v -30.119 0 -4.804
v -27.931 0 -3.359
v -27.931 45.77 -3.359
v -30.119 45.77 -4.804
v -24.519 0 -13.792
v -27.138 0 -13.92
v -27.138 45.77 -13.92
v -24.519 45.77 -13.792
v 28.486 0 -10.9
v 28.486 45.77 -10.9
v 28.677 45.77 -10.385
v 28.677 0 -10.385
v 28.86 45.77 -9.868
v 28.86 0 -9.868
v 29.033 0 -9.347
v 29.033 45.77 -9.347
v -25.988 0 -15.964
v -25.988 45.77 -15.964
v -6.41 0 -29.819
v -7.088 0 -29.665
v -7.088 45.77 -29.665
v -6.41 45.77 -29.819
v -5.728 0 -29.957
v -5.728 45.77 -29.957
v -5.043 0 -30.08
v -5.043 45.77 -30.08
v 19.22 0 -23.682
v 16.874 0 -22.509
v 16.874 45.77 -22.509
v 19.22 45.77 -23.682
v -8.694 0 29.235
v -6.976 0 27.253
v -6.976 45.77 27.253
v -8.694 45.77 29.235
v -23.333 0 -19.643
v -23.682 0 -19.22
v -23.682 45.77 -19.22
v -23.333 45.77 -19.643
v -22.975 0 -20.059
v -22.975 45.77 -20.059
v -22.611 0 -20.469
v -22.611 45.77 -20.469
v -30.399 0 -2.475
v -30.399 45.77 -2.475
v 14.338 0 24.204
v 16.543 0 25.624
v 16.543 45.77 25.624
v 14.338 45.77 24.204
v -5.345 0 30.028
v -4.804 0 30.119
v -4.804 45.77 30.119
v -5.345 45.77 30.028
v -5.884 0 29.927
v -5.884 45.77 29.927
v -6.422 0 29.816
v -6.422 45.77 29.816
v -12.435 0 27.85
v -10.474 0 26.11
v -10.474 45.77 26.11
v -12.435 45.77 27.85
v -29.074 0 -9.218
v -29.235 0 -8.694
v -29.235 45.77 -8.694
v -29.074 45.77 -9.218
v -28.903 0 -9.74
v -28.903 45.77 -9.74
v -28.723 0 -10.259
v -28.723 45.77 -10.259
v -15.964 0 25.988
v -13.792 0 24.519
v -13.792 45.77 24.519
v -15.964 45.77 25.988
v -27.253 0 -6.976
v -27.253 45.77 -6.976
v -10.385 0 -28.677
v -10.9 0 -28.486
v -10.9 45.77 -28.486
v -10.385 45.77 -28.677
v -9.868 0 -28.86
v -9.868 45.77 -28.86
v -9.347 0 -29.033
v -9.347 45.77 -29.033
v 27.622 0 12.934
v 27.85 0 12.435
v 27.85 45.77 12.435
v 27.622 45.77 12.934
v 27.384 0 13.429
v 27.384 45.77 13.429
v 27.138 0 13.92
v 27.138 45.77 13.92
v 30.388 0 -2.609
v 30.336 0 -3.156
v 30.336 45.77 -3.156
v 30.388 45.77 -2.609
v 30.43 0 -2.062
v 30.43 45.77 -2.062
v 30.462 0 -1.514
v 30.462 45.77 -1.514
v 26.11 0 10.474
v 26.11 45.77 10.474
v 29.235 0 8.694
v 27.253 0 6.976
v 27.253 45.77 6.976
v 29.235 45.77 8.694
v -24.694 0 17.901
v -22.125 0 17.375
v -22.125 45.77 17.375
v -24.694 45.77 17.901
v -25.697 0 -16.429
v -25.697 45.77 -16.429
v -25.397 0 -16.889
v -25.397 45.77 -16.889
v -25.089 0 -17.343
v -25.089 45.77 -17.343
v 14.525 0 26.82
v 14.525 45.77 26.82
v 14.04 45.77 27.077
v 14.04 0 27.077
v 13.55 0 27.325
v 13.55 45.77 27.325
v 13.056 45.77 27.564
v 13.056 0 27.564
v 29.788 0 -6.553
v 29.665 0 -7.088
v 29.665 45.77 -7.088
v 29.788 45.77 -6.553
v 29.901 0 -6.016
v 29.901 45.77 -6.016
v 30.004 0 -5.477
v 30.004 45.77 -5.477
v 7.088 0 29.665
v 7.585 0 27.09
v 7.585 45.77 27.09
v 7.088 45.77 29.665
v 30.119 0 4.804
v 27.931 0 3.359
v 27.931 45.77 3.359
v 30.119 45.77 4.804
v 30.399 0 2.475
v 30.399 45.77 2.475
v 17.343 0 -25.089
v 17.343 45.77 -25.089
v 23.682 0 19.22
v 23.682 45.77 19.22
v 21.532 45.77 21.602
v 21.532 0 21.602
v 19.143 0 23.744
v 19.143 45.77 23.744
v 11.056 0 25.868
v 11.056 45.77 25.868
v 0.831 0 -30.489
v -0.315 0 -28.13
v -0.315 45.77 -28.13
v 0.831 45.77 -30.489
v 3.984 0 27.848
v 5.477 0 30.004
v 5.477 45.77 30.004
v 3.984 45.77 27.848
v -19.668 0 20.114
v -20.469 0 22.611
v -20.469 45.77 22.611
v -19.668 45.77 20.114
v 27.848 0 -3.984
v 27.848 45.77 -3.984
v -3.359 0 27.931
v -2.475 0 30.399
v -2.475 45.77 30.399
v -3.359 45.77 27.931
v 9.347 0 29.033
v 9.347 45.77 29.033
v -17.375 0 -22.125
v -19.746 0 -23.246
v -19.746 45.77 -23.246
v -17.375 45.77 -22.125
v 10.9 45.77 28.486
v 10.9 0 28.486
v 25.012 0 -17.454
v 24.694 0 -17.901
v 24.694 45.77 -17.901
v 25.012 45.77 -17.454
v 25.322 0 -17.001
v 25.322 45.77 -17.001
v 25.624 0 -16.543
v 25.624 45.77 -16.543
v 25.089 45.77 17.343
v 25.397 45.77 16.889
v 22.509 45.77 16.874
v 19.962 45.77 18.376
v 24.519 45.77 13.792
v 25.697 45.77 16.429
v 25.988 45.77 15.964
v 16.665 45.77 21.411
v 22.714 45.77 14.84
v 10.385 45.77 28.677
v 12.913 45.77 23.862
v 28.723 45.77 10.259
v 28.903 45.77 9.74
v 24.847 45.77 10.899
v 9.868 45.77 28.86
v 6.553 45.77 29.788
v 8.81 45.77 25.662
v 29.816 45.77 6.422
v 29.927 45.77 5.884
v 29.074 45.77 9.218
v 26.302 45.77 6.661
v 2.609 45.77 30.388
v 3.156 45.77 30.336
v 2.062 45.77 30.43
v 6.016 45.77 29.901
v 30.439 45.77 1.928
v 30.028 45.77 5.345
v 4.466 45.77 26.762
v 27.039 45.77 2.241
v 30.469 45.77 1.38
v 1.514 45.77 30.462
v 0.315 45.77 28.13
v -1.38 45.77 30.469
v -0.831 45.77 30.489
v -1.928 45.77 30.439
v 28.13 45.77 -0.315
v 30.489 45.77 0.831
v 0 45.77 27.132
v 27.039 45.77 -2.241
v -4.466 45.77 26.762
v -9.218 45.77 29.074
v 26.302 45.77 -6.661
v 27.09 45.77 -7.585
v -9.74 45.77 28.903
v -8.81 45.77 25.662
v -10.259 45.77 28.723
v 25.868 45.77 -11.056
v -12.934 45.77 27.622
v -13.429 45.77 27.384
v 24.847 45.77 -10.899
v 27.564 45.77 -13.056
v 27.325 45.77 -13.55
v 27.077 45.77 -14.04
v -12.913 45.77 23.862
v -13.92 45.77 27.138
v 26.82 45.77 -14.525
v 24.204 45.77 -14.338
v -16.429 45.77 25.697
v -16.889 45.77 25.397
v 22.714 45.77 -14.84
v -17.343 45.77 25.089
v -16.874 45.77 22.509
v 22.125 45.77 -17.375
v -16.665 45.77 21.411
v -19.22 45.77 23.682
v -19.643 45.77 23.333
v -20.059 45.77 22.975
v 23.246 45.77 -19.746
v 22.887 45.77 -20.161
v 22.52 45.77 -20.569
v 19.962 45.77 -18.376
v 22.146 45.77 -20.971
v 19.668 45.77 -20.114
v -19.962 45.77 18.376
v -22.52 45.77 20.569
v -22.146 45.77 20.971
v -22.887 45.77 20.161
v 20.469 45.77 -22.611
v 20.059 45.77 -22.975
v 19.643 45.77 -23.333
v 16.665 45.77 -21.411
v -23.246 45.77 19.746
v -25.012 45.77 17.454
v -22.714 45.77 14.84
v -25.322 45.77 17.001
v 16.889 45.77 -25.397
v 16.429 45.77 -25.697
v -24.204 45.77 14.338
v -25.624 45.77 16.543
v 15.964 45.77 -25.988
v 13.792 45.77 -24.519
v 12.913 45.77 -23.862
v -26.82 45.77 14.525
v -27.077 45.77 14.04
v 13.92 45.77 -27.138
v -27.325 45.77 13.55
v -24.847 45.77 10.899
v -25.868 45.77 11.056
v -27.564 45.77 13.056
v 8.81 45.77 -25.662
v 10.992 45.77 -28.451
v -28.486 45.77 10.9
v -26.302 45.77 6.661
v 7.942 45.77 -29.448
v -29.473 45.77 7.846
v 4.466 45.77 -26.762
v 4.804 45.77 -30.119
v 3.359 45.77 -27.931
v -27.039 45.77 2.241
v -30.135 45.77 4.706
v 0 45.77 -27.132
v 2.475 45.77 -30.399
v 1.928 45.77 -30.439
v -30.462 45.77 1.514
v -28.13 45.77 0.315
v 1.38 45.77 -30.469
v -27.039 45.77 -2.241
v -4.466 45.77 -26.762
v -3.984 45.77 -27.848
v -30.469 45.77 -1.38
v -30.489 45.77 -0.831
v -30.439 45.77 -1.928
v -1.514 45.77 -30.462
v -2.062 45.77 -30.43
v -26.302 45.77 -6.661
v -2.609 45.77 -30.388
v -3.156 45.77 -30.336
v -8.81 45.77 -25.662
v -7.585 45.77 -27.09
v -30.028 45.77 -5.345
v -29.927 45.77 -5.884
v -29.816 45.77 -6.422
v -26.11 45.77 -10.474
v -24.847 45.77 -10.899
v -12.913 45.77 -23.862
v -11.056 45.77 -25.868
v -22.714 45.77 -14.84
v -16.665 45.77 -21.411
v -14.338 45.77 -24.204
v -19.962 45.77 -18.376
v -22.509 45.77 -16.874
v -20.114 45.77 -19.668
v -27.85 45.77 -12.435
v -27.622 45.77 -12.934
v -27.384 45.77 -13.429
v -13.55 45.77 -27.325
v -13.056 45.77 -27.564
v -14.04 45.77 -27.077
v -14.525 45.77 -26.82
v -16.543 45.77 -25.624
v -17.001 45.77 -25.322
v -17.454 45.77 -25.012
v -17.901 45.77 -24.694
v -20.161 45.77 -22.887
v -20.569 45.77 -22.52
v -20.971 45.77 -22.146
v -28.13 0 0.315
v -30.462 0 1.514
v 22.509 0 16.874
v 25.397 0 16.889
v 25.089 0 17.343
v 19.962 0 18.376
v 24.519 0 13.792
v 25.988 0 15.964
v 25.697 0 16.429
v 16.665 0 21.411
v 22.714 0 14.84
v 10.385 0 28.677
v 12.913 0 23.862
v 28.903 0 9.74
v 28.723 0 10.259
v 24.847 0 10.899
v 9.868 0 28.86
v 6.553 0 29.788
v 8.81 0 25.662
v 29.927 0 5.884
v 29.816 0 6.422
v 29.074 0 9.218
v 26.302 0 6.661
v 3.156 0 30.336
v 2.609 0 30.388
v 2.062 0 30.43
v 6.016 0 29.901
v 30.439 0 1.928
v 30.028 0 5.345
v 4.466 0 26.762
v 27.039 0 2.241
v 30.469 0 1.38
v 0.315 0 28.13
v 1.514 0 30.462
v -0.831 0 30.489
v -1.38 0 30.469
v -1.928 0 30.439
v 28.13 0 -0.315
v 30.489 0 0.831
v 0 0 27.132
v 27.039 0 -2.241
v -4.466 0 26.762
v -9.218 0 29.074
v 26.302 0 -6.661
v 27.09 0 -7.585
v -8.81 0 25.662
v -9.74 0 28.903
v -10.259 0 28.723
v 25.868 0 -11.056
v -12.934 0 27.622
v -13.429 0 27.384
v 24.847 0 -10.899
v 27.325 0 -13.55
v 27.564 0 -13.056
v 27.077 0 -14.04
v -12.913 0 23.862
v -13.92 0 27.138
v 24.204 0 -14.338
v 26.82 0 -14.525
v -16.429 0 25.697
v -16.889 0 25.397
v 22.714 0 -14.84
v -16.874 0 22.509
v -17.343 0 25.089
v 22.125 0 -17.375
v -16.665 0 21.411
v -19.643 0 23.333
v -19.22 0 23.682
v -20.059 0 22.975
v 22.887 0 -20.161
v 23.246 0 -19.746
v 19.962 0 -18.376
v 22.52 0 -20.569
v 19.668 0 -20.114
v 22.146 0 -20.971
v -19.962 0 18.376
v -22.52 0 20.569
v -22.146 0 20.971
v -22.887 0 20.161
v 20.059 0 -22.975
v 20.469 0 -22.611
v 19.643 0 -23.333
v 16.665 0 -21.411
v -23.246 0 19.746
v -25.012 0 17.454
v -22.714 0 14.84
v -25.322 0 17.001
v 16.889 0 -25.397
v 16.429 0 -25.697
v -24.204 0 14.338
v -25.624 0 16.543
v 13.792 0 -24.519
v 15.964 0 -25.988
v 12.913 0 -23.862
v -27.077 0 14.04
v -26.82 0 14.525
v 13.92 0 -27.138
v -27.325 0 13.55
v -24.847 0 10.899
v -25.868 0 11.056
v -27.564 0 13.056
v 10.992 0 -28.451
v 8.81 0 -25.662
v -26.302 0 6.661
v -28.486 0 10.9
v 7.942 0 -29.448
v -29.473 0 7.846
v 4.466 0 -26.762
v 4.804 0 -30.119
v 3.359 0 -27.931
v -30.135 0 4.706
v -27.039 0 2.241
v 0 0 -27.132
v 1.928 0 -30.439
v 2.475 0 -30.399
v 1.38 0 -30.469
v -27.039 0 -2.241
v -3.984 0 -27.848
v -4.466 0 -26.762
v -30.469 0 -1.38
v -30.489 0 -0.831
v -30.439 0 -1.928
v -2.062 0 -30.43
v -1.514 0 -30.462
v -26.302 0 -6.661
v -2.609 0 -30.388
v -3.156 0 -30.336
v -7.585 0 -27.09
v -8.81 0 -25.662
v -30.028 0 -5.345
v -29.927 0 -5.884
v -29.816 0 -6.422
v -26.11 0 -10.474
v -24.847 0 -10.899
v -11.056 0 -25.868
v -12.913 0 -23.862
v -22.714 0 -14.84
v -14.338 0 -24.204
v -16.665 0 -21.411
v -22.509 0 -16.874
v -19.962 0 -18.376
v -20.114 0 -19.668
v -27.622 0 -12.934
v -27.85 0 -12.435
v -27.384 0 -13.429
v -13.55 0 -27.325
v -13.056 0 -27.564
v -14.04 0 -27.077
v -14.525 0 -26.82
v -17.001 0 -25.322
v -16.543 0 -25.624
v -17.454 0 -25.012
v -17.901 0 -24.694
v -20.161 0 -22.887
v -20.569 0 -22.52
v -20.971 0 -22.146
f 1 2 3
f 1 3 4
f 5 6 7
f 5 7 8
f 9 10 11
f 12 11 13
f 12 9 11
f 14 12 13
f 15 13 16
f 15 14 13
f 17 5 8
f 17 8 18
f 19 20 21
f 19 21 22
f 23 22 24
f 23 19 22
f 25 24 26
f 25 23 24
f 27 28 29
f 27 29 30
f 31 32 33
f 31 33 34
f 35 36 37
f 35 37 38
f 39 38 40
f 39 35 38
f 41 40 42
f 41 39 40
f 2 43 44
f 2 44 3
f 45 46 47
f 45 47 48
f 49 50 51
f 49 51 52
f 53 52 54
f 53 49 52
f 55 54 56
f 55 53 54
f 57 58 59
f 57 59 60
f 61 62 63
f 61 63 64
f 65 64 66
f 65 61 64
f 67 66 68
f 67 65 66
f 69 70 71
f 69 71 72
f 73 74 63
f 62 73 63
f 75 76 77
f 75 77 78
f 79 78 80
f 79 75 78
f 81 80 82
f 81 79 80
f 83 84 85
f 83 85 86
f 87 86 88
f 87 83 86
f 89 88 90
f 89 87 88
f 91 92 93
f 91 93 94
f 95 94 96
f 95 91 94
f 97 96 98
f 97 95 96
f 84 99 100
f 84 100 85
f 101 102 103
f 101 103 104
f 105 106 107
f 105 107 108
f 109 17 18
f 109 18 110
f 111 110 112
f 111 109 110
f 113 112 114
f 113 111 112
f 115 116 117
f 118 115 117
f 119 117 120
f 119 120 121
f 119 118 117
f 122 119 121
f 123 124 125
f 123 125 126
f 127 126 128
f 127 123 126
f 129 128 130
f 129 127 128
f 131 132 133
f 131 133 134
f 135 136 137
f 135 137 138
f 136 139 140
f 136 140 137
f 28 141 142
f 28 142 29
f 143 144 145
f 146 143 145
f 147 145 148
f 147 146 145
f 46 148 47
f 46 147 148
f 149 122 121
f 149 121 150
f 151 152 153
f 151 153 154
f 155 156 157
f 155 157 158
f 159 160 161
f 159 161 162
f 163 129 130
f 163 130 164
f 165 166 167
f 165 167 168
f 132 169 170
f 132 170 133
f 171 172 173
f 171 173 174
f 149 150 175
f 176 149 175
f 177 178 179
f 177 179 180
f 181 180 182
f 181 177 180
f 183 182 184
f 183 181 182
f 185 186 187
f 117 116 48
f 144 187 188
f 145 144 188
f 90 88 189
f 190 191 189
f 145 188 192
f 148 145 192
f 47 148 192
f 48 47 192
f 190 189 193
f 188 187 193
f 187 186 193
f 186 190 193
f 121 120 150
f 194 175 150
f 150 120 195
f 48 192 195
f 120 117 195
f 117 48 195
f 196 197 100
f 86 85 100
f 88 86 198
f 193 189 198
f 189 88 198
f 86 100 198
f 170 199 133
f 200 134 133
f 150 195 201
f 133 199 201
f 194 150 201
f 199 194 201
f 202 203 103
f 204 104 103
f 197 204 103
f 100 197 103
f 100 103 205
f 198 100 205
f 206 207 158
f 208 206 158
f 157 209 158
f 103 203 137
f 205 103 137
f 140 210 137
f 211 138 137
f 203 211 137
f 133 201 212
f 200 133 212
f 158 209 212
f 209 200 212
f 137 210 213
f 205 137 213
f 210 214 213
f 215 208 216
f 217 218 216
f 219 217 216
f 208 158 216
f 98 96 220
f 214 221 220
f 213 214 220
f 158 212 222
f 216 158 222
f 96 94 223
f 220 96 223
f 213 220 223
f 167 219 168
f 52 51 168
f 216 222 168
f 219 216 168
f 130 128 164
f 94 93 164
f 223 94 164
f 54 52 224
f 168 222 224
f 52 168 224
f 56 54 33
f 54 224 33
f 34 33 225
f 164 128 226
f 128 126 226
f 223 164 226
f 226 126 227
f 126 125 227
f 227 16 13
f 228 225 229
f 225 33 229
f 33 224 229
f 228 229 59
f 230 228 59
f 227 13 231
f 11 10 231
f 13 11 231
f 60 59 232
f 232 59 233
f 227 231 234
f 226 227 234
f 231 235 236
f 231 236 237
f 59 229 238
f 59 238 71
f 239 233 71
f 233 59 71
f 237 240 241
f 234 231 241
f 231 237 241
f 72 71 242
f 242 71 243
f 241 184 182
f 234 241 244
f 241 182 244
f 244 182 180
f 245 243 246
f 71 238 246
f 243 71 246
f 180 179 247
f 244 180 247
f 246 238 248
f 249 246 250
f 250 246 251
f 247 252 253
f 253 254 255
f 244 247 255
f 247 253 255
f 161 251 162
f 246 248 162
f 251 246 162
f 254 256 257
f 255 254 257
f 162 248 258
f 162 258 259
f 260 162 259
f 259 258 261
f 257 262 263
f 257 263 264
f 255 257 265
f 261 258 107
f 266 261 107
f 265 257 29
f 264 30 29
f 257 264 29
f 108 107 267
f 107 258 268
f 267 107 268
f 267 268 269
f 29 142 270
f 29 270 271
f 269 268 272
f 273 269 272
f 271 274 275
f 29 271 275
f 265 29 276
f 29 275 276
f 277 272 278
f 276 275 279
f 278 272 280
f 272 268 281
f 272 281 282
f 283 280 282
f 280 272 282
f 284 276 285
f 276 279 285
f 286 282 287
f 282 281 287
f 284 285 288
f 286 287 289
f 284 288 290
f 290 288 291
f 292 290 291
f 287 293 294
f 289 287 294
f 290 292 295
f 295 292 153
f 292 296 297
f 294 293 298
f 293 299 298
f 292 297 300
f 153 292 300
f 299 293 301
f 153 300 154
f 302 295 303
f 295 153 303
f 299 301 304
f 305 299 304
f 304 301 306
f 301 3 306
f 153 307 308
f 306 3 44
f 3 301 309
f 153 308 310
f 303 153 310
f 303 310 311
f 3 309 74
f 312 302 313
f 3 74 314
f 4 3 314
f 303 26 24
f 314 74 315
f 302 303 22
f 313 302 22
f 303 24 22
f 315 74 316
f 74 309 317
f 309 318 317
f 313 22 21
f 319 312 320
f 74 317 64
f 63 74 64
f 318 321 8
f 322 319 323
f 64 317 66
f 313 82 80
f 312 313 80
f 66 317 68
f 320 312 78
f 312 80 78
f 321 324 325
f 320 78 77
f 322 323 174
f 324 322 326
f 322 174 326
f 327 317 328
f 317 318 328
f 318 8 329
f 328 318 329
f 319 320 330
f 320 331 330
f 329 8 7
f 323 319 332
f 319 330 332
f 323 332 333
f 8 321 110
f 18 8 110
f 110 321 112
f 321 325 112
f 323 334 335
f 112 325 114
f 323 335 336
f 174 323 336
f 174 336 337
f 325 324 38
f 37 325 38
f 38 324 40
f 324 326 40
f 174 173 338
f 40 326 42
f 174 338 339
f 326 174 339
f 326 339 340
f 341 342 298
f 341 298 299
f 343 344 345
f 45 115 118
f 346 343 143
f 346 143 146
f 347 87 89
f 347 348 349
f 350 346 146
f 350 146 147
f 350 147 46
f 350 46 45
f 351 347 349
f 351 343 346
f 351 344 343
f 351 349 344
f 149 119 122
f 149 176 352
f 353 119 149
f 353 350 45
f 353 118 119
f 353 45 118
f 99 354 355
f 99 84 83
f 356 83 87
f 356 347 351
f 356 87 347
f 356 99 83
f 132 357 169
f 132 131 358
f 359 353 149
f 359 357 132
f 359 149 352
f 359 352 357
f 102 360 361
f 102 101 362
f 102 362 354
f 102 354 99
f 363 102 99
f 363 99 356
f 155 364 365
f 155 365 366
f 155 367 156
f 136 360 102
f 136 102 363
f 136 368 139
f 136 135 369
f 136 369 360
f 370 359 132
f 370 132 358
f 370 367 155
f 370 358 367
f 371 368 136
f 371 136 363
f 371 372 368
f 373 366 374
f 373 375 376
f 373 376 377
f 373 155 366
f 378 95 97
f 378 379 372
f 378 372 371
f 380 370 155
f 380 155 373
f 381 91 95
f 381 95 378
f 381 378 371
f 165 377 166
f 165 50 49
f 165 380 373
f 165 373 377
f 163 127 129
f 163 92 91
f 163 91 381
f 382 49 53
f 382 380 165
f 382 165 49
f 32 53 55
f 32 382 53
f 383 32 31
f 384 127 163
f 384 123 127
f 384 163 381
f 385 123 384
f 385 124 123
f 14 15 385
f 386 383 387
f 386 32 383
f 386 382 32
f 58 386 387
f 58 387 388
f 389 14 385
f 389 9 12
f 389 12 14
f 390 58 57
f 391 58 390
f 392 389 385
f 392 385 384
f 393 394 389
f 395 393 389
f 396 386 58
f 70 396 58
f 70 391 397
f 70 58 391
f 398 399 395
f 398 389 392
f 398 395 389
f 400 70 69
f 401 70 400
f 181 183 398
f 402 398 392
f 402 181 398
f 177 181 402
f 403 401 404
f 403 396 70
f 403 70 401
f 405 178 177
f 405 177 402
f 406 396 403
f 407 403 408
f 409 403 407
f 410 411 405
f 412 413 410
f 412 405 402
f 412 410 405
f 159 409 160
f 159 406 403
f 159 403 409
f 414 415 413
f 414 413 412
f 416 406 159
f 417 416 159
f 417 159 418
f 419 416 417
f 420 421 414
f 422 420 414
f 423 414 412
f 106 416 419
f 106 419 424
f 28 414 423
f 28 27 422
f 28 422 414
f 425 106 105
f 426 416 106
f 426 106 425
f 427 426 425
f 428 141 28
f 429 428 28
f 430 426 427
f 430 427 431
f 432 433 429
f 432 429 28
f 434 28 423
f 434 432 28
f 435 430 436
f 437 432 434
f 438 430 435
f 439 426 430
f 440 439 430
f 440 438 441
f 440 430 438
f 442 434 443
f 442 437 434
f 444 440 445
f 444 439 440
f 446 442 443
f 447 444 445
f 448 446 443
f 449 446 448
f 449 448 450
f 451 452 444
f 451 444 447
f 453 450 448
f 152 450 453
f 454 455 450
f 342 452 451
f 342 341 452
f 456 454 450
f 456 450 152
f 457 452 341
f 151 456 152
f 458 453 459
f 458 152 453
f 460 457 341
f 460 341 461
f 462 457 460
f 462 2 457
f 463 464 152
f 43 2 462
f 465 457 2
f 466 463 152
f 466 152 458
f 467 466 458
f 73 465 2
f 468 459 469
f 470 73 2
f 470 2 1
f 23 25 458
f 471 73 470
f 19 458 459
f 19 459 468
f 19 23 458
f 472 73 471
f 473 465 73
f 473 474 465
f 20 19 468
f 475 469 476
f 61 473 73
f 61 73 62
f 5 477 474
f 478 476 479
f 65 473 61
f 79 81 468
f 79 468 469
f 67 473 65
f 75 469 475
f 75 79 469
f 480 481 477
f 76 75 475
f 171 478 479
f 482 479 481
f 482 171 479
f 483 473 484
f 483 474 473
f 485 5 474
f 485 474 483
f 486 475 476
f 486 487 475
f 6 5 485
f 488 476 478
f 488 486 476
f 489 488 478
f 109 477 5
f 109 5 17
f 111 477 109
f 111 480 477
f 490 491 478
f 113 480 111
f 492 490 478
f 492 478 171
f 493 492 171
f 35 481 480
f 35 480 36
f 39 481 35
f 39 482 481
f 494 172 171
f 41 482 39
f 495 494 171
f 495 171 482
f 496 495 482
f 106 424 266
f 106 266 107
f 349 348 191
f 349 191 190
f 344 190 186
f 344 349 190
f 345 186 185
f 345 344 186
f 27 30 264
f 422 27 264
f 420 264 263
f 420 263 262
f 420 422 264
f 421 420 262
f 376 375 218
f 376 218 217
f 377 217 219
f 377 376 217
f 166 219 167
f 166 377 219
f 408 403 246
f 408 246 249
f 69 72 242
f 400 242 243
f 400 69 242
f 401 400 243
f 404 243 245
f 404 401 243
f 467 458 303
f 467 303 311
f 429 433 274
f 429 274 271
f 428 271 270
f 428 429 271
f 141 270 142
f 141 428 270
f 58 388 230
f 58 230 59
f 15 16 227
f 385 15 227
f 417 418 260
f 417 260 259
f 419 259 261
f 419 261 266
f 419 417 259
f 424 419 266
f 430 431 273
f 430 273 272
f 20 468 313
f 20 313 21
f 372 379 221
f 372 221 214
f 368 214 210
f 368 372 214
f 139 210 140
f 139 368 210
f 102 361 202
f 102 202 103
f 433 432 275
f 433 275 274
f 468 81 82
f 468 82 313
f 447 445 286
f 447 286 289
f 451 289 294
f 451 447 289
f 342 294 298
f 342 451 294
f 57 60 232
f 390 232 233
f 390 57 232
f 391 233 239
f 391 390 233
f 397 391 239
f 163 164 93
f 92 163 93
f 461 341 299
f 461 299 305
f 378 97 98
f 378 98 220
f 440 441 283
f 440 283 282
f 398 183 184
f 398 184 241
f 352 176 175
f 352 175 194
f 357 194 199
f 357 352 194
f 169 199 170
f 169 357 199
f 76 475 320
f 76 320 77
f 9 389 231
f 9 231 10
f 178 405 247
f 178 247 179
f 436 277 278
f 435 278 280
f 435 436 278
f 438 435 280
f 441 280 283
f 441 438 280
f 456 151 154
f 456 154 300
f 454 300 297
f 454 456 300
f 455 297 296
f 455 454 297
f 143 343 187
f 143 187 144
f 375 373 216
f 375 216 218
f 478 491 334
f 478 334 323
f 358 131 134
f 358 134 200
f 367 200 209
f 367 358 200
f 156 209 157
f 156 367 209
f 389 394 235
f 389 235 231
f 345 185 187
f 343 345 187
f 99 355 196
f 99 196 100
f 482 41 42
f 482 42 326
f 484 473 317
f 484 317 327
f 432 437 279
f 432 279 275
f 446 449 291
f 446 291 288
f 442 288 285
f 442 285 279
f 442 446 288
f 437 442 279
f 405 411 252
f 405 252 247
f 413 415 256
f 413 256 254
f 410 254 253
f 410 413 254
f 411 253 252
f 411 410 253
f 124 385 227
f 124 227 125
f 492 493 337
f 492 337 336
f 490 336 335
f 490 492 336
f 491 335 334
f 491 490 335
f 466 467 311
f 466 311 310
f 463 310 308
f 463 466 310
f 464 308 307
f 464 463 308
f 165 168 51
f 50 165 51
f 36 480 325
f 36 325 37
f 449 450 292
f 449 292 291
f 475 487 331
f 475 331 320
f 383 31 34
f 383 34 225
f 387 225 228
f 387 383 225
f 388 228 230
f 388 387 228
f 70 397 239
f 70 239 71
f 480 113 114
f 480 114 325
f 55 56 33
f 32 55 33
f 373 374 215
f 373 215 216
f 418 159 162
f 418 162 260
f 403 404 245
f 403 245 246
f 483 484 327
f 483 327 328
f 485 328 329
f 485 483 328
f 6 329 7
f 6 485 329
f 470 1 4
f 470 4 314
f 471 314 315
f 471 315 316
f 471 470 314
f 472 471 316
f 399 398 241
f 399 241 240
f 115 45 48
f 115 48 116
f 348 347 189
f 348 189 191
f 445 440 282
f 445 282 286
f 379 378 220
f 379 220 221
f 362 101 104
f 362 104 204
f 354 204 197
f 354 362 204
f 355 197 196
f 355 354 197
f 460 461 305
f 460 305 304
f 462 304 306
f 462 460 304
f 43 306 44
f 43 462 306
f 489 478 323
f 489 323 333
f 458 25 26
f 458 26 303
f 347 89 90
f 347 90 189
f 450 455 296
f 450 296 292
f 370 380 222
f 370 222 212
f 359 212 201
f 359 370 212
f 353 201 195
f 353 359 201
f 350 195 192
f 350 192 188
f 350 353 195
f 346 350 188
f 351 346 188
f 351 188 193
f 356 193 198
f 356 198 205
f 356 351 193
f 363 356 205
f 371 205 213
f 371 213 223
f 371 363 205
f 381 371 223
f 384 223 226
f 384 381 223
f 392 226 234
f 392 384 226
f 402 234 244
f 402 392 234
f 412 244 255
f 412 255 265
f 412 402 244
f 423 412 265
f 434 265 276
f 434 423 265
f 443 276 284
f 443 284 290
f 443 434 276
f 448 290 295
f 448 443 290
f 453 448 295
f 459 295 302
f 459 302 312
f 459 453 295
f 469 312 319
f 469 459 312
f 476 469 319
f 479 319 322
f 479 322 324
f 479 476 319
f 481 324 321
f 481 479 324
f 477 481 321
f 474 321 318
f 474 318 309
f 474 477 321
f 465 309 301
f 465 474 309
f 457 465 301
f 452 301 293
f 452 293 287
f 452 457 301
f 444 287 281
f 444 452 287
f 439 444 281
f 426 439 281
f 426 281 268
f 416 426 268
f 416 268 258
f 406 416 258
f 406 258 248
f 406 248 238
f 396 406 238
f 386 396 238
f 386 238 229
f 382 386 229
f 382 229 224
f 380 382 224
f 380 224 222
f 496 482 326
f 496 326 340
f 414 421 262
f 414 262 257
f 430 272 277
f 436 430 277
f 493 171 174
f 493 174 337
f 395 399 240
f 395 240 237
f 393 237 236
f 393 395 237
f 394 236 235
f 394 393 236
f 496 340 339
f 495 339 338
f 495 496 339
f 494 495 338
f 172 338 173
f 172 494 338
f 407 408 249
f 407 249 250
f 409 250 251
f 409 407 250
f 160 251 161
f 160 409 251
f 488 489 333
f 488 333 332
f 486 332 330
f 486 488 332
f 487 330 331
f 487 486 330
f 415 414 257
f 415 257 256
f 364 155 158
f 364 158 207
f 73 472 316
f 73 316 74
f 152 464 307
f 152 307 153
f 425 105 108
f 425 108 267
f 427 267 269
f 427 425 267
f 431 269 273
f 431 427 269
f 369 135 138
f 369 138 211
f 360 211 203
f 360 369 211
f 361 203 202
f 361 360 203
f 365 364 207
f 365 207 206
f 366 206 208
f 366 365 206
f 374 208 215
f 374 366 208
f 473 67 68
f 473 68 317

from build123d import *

# Parameters (mm, degrees)
SKETCH1_R           = 27.131966011
BOSS_EXTRUDE1_DEPTH = 45.77


with BuildPart() as part:
    # Sketch1 → Boss-Extrude1 (new body)
    with BuildSketch(Plane(origin=(0, 0, 0), x_dir=(1, 0, 0), z_dir=(0, 1, 0))):
        with BuildLine():
            Line((-3.984261156, 27.848398027), (-3.155526874, 30.336328812))
            ThreePointArc((-3.155526874, 30.336328812), (-2.335703763, 30.410437264), (-1.5141793, 30.462394497))
            Line((-1.5141793, 30.462394497), (-0.315230151, 28.130201914))
            Line((-0.315230151, 28.130201914), (0.831154566, 30.48867707))
            ThreePointArc((0.831154566, 30.48867707), (1.65363686, 30.455143124), (2.474914637, 30.399425407))
            Line((2.474914637, 30.399425407), (3.359194573, 27.930690283))
            Line((3.359194573, 27.930690283), (4.803614875, 30.119355554))
            ThreePointArc((4.803614875, 30.119355554), (9.479661295, 28.989418191), (13.919878882, 27.138300594))
            Line((13.919878882, 27.138300594), (13.792102919, 24.51908612))
            Line((13.792102919, 24.51908612), (15.964140245, 25.988394149))
            ThreePointArc((15.964140245, 25.988394149), (16.659663243, 25.548112068), (17.343051232, 25.089220567))
            Line((17.343051232, 25.089220567), (16.874492259, 22.509091617))
            Line((16.874492259, 22.509091617), (19.21973095, 23.682321883))
            ThreePointArc((19.21973095, 23.682321883), (19.851835217, 23.155022565), (20.469479277, 22.610856977))
            Line((20.469479277, 22.610856977), (19.668154402, 20.113960352))
            Line((19.668154402, 20.113960352), (22.146466743, 20.971038467))
            ThreePointArc((22.146466743, 20.971038467), (22.704336831, 20.365744156), (23.245668935, 19.745615304))
            Line((23.245668935, 19.745615304), (22.125289014, 17.374673686))
            Line((22.125289014, 17.374673686), (24.69427034, 17.900934736))
            ThreePointArc((24.69427034, 17.900934736), (25.168360968, 17.228002177), (25.624118803, 16.542520632))
            Line((25.624118803, 16.542520632), (24.203853841, 14.338101571))
            Line((24.203853841, 14.338101571), (26.8195481, 14.52454104))
            ThreePointArc((26.8195481, 14.52454104), (27.201747469, 13.795484281), (27.564132913, 13.056378805))
            Line((27.564132913, 13.056378805), (25.868284062, 11.0562006))
            Line((25.868284062, 11.0562006), (28.485935925, 10.899628442))
            ThreePointArc((28.485935925, 10.899628442), (28.769704511, 10.126921824), (29.032517063, 9.346838694))
            Line((29.032517063, 9.346838694), (27.090100815, 7.585125008))
            Line((27.090100815, 7.585125008), (29.664921456, 7.088220232))
            ThreePointArc((29.664921456, 7.088220232), (29.845403904, 6.285084953), (30.00414677, 5.47737158))
            Line((30.00414677, 5.47737158), (27.848398476, 3.984265861))
            Line((27.848398476, 3.984265861), (30.336331931, 3.15553069))
            ThreePointArc((30.336331931, 3.15553069), (30.410440131, 2.33570859), (30.462397167, 1.514185147))
            Line((30.462397167, 1.514185147), (28.130202362, 0.315234856))
            Line((28.130202362, 0.315234856), (30.488679348, -0.83115075))
            ThreePointArc((30.488679348, -0.83115075), (30.455145268, -1.653632314), (30.399427457, -2.474909359))
            Line((30.399427457, -2.474909359), (27.930690731, -3.359189868))
            Line((27.930690731, -3.359189868), (30.11935702, -4.803610841))
            ThreePointArc((30.11935702, -4.803610841), (29.97875441, -5.614679004), (29.81631507, -6.421657392))
            Line((29.81631507, -6.421657392), (27.253277282, -6.976137886))
            Line((27.253277282, -6.976137886), (29.234684181, -8.693879674))
            ThreePointArc((29.234684181, -8.693879674), (28.989418755, -9.479656851), (28.723037229, -10.258528973))
            Line((28.723037229, -10.258528973), (26.109552746, -10.473722214))
            Line((26.109552746, -10.473722214), (27.849797859, -12.435393664))
            ThreePointArc((27.849797859, -12.435393664), (27.504066132, -13.182434995), (27.138300238, -13.919874138))
            Line((27.138300238, -13.919874138), (24.519086569, -13.792098214))
            Line((24.519086569, -13.792098214), (25.988393872, -15.964134468))
            ThreePointArc((25.988393872, -15.964134468), (25.548111361, -16.659657866), (25.089219408, -17.343046235))
            Line((25.089219408, -17.343046235), (22.509092066, -16.874487554))
            Line((22.509092066, -16.874487554), (23.682321388, -19.219724361))
            ThreePointArc((23.682321388, -19.219724361), (20.365742572, -22.704330231), (16.542517807, -25.624111989))
            Line((16.542517807, -25.624111989), (14.33810202, -24.203849136))
            Line((14.33810202, -24.203849136), (14.524541185, -26.819539129))
            ThreePointArc((14.524541185, -26.819539129), (13.795482869, -27.201739208), (13.056375797, -27.564125279))
            Line((13.056375797, -27.564125279), (11.056201049, -25.868279357))
            Line((11.056201049, -25.868279357), (10.899629182, -28.485926359))
            ThreePointArc((10.899629182, -28.485926359), (10.126920725, -28.76969554), (9.346835723, -29.032508588))
            Line((9.346835723, -29.032508588), (7.585125457, -27.09009611))
            Line((7.585125457, -27.09009611), (7.0882217, -29.66491147))
            ThreePointArc((7.0882217, -29.66491147), (6.285084339, -29.845394329), (5.477368862, -30.004137493))
            Line((5.477368862, -30.004137493), (3.984266309, -27.848393771))
            Line((3.984266309, -27.848393771), (3.15553297, -30.336321728))
            ThreePointArc((3.15553297, -30.336321728), (2.3357086, -30.410430097), (1.51418288, -30.462387181))
            Line((1.51418288, -30.462387181), (0.315235305, -28.130197658))
            Line((0.315235305, -28.130197658), (-0.831147629, -30.488669145))
            ThreePointArc((-0.831147629, -30.488669145), (-1.653631581, -30.455134954), (-2.474911005, -30.399416902))
            Line((-2.474911005, -30.399416902), (-3.35918942, -27.930686027))
            Line((-3.35918942, -27.930686027), (-4.803606908, -30.119347035))
            ThreePointArc((-4.803606908, -30.119347035), (-5.614677501, -29.978744012), (-6.421658293, -29.816304126))
            Line((-6.421658293, -29.816304126), (-6.976137437, -27.253272577))
            Line((-6.976137437, -27.253272577), (-8.693875013, -29.234674617))
            ThreePointArc((-8.693875013, -29.234674617), (-9.479654581, -28.989408474), (-10.258529053, -28.723026103))
            Line((-10.258529053, -28.723026103), (-10.473721765, -26.109548042))
            Line((-10.473721765, -26.109548042), (-12.435388408, -27.84978889))
            ThreePointArc((-12.435388408, -27.84978889), (-13.182432016, -27.504056163), (-13.919873378, -27.138289149))
            Line((-13.919873378, -27.138289149), (-13.792097766, -24.519081864))
            Line((-13.792097766, -24.519081864), (-15.964128792, -25.988385631))
            ThreePointArc((-15.964128792, -25.988385631), (-16.659654283, -25.548101878), (-17.343044673, -25.089208572))
            Line((-17.343044673, -25.089208572), (-16.874487106, -22.509087361))
            Line((-16.874487106, -22.509087361), (-19.219718467, -23.68231396))
            ThreePointArc((-19.219718467, -23.68231396), (-19.851825173, -23.155012543), (-20.469471557, -22.610844724))
            Line((-20.469471557, -22.610844724), (-19.668149248, -20.113956096))
            Line((-19.668149248, -20.113956096), (-22.146453419, -20.971031386))
            ThreePointArc((-22.146453419, -20.971031386), (-22.704325784, -20.365734574), (-23.245660027, -19.745603103))
            Line((-23.245660027, -19.745603103), (-22.125283861, -17.374669429))
            Line((-22.125283861, -17.374669429), (-24.694256422, -17.900928684))
            ThreePointArc((-24.694256422, -17.900928684), (-25.168349066, -17.227993282), (-25.62410876, -16.542508787))
            Line((-25.62410876, -16.542508787), (-24.203848687, -14.338097315))
            Line((-24.203848687, -14.338097315), (-26.819533875, -14.524536138))
            ThreePointArc((-26.819533875, -14.524536138), (-27.201734918, -13.79547627), (-27.564121868, -13.056367599))
            Line((-27.564121868, -13.056367599), (-25.868278909, -11.056196344))
            Line((-25.868278909, -11.056196344), (-28.4859217, -10.899624729))
            ThreePointArc((-28.4859217, -10.899624729), (-29.845390828, -6.285079097), (-30.462384511, -1.514177033))
            Line((-30.462384511, -1.514177033), (-28.130197209, -0.3152306))
            Line((-28.130197209, -0.3152306), (-30.488666867, 0.831151445))
            ThreePointArc((-30.488666867, 0.831151445), (-30.455132809, 1.653636127), (-30.399414852, 2.474916284))
            Line((-30.399414852, 2.474916284), (-27.930685578, 3.359194124))
            Line((-27.930685578, 3.359194124), (-30.119345569, 4.803610941))
            ThreePointArc((-30.119345569, 4.803610941), (-29.978742638, 5.614681962), (-29.816302822, 6.421663183))
            Line((-29.816302822, 6.421663183), (-27.253272129, 6.976142142))
            Line((-27.253272129, 6.976142142), (-29.23467388, 8.693879467))
            ThreePointArc((-29.23467388, 8.693879467), (-28.989407866, 9.479659161), (-28.72302562, 10.258533761))
            Line((-28.72302562, 10.258533761), (-26.109547593, 10.47372647))
            Line((-26.109547593, 10.47372647), (-27.849788746, 12.435393457))
            ThreePointArc((-27.849788746, 12.435393457), (-27.504056265, 13.182436908), (-27.138289505, 13.919878122))
            Line((-27.138289505, 13.919878122), (-24.519081415, 13.792102471))
            Line((-24.519081415, 13.792102471), (-25.988385908, 15.964134569))
            ThreePointArc((-25.988385908, 15.964134569), (-25.548102584, 16.65965966), (-25.089209731, 17.34304967))
            Line((-25.089209731, 17.34304967), (-22.509086912, 16.87449181))
            Line((-22.509086912, 16.87449181), (-23.682314454, 19.219725057))
            ThreePointArc((-23.682314454, 19.219725057), (-23.155013707, 19.851831175), (-22.610846592, 20.469477005))
            Line((-22.610846592, 20.469477005), (-20.113955647, 19.668153953))
            Line((-20.113955647, 19.668153953), (-20.97103188, 22.14646085))
            ThreePointArc((-20.97103188, 22.14646085), (-20.36573602, 22.704332508), (-19.745605539, 23.245666095))
            Line((-19.745605539, 23.245666095), (-17.374668981, 22.125288565))
            Line((-17.374668981, 22.125288565), (-17.90092896, 24.694264665))
            ThreePointArc((-17.90092896, 24.694264665), (-17.227994811, 25.168356561), (-16.542511612, 25.624115574))
            Line((-16.542511612, 25.624115574), (-14.338096867, 24.203853392))
            Line((-14.338096867, 24.203853392), (-14.524535993, 26.819542846))
            ThreePointArc((-14.524535993, 26.819542846), (-13.795477682, 27.20174318), (-13.056370606, 27.564129503))
            Line((-13.056370606, 27.564129503), (-11.056195896, 25.868283613))
            Line((-11.056195896, 25.868283613), (-10.89962399, 28.485931265))
            ThreePointArc((-10.89962399, 28.485931265), (-10.126915935, 28.769700534), (-9.346831335, 29.032513688))
            Line((-9.346831335, 29.032513688), (-7.585120303, 27.090100366))
            Line((-7.585120303, 27.090100366), (-7.088216199, 29.664917524))
            ThreePointArc((-7.088216199, 29.664917524), (-6.06936901, 29.890013635), (-5.043418528, 30.08012798))
            Line((-5.043418528, 30.08012798), (-3.984261156, 27.848398027))
        make_face()
        with Locations(Location((2.577e-06, 2.128e-06, 0), (0, 0, 270))):
            Circle(SKETCH1_R, mode=Mode.SUBTRACT)
    extrude(amount=BOSS_EXTRUDE1_DEPTH)


solid = part.part
